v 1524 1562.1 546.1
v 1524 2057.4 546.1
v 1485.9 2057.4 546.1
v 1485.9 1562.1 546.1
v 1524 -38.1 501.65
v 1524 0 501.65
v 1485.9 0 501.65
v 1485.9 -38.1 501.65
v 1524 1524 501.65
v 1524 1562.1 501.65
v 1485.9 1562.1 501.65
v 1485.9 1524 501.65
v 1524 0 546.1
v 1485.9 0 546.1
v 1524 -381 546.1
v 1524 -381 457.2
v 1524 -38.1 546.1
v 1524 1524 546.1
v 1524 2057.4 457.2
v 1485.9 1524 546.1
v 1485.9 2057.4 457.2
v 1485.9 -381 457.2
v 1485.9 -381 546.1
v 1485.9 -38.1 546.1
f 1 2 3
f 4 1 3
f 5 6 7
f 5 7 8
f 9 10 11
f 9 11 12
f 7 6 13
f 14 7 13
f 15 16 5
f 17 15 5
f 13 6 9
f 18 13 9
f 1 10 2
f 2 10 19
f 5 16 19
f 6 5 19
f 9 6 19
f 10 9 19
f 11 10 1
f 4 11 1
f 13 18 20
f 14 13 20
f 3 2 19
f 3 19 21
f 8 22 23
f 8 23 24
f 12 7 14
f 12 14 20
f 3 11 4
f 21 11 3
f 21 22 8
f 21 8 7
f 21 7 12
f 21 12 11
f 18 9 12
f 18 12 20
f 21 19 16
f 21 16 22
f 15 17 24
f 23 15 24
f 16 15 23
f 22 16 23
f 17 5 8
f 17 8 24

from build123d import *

# Parameters (mm, degrees)
BOX007_W        = 38.1
BOX007_H        = 2438.4
BOX007_DEPTH    = 88.9
SKETCH004_W     = 38.1
SKETCH004_H     = 44.45
POCKET004_DEPTH = 38.101


with BuildPart() as pocket004:
    # Box007 → Box007 (new body)
    with BuildSketch(Plane(origin=(0, -381, 457.2), x_dir=(1, 0, 0), z_dir=(0, 0, 1))):
        with Locations((19.05, 1219.2)):
            Rectangle(BOX007_W, BOX007_H)
    extrude(amount=BOX007_DEPTH)

    # Sketch004 → Pocket004 (cut, through all)
    with BuildSketch(Plane(origin=(0, -381, 457.2), x_dir=(0, -1, 0), z_dir=(-1, 0, 0))):
        with Locations((-361.95, 66.675)):
            Rectangle(SKETCH004_W, SKETCH004_H)
        with Locations((-1924.05, 66.675)):
            Rectangle(SKETCH004_W, SKETCH004_H)
    extrude(amount=-POCKET004_DEPTH, mode=Mode.SUBTRACT)


with BuildPart() as eastfloorbeam:
    # Part__Mirroring002: instance of Pocket004
    add(pocket004.part.mirror(Plane(origin=(762, 0, 0), x_dir=(0, -1, 0), z_dir=(1, 0, 0))))


solid = eastfloorbeam.part
